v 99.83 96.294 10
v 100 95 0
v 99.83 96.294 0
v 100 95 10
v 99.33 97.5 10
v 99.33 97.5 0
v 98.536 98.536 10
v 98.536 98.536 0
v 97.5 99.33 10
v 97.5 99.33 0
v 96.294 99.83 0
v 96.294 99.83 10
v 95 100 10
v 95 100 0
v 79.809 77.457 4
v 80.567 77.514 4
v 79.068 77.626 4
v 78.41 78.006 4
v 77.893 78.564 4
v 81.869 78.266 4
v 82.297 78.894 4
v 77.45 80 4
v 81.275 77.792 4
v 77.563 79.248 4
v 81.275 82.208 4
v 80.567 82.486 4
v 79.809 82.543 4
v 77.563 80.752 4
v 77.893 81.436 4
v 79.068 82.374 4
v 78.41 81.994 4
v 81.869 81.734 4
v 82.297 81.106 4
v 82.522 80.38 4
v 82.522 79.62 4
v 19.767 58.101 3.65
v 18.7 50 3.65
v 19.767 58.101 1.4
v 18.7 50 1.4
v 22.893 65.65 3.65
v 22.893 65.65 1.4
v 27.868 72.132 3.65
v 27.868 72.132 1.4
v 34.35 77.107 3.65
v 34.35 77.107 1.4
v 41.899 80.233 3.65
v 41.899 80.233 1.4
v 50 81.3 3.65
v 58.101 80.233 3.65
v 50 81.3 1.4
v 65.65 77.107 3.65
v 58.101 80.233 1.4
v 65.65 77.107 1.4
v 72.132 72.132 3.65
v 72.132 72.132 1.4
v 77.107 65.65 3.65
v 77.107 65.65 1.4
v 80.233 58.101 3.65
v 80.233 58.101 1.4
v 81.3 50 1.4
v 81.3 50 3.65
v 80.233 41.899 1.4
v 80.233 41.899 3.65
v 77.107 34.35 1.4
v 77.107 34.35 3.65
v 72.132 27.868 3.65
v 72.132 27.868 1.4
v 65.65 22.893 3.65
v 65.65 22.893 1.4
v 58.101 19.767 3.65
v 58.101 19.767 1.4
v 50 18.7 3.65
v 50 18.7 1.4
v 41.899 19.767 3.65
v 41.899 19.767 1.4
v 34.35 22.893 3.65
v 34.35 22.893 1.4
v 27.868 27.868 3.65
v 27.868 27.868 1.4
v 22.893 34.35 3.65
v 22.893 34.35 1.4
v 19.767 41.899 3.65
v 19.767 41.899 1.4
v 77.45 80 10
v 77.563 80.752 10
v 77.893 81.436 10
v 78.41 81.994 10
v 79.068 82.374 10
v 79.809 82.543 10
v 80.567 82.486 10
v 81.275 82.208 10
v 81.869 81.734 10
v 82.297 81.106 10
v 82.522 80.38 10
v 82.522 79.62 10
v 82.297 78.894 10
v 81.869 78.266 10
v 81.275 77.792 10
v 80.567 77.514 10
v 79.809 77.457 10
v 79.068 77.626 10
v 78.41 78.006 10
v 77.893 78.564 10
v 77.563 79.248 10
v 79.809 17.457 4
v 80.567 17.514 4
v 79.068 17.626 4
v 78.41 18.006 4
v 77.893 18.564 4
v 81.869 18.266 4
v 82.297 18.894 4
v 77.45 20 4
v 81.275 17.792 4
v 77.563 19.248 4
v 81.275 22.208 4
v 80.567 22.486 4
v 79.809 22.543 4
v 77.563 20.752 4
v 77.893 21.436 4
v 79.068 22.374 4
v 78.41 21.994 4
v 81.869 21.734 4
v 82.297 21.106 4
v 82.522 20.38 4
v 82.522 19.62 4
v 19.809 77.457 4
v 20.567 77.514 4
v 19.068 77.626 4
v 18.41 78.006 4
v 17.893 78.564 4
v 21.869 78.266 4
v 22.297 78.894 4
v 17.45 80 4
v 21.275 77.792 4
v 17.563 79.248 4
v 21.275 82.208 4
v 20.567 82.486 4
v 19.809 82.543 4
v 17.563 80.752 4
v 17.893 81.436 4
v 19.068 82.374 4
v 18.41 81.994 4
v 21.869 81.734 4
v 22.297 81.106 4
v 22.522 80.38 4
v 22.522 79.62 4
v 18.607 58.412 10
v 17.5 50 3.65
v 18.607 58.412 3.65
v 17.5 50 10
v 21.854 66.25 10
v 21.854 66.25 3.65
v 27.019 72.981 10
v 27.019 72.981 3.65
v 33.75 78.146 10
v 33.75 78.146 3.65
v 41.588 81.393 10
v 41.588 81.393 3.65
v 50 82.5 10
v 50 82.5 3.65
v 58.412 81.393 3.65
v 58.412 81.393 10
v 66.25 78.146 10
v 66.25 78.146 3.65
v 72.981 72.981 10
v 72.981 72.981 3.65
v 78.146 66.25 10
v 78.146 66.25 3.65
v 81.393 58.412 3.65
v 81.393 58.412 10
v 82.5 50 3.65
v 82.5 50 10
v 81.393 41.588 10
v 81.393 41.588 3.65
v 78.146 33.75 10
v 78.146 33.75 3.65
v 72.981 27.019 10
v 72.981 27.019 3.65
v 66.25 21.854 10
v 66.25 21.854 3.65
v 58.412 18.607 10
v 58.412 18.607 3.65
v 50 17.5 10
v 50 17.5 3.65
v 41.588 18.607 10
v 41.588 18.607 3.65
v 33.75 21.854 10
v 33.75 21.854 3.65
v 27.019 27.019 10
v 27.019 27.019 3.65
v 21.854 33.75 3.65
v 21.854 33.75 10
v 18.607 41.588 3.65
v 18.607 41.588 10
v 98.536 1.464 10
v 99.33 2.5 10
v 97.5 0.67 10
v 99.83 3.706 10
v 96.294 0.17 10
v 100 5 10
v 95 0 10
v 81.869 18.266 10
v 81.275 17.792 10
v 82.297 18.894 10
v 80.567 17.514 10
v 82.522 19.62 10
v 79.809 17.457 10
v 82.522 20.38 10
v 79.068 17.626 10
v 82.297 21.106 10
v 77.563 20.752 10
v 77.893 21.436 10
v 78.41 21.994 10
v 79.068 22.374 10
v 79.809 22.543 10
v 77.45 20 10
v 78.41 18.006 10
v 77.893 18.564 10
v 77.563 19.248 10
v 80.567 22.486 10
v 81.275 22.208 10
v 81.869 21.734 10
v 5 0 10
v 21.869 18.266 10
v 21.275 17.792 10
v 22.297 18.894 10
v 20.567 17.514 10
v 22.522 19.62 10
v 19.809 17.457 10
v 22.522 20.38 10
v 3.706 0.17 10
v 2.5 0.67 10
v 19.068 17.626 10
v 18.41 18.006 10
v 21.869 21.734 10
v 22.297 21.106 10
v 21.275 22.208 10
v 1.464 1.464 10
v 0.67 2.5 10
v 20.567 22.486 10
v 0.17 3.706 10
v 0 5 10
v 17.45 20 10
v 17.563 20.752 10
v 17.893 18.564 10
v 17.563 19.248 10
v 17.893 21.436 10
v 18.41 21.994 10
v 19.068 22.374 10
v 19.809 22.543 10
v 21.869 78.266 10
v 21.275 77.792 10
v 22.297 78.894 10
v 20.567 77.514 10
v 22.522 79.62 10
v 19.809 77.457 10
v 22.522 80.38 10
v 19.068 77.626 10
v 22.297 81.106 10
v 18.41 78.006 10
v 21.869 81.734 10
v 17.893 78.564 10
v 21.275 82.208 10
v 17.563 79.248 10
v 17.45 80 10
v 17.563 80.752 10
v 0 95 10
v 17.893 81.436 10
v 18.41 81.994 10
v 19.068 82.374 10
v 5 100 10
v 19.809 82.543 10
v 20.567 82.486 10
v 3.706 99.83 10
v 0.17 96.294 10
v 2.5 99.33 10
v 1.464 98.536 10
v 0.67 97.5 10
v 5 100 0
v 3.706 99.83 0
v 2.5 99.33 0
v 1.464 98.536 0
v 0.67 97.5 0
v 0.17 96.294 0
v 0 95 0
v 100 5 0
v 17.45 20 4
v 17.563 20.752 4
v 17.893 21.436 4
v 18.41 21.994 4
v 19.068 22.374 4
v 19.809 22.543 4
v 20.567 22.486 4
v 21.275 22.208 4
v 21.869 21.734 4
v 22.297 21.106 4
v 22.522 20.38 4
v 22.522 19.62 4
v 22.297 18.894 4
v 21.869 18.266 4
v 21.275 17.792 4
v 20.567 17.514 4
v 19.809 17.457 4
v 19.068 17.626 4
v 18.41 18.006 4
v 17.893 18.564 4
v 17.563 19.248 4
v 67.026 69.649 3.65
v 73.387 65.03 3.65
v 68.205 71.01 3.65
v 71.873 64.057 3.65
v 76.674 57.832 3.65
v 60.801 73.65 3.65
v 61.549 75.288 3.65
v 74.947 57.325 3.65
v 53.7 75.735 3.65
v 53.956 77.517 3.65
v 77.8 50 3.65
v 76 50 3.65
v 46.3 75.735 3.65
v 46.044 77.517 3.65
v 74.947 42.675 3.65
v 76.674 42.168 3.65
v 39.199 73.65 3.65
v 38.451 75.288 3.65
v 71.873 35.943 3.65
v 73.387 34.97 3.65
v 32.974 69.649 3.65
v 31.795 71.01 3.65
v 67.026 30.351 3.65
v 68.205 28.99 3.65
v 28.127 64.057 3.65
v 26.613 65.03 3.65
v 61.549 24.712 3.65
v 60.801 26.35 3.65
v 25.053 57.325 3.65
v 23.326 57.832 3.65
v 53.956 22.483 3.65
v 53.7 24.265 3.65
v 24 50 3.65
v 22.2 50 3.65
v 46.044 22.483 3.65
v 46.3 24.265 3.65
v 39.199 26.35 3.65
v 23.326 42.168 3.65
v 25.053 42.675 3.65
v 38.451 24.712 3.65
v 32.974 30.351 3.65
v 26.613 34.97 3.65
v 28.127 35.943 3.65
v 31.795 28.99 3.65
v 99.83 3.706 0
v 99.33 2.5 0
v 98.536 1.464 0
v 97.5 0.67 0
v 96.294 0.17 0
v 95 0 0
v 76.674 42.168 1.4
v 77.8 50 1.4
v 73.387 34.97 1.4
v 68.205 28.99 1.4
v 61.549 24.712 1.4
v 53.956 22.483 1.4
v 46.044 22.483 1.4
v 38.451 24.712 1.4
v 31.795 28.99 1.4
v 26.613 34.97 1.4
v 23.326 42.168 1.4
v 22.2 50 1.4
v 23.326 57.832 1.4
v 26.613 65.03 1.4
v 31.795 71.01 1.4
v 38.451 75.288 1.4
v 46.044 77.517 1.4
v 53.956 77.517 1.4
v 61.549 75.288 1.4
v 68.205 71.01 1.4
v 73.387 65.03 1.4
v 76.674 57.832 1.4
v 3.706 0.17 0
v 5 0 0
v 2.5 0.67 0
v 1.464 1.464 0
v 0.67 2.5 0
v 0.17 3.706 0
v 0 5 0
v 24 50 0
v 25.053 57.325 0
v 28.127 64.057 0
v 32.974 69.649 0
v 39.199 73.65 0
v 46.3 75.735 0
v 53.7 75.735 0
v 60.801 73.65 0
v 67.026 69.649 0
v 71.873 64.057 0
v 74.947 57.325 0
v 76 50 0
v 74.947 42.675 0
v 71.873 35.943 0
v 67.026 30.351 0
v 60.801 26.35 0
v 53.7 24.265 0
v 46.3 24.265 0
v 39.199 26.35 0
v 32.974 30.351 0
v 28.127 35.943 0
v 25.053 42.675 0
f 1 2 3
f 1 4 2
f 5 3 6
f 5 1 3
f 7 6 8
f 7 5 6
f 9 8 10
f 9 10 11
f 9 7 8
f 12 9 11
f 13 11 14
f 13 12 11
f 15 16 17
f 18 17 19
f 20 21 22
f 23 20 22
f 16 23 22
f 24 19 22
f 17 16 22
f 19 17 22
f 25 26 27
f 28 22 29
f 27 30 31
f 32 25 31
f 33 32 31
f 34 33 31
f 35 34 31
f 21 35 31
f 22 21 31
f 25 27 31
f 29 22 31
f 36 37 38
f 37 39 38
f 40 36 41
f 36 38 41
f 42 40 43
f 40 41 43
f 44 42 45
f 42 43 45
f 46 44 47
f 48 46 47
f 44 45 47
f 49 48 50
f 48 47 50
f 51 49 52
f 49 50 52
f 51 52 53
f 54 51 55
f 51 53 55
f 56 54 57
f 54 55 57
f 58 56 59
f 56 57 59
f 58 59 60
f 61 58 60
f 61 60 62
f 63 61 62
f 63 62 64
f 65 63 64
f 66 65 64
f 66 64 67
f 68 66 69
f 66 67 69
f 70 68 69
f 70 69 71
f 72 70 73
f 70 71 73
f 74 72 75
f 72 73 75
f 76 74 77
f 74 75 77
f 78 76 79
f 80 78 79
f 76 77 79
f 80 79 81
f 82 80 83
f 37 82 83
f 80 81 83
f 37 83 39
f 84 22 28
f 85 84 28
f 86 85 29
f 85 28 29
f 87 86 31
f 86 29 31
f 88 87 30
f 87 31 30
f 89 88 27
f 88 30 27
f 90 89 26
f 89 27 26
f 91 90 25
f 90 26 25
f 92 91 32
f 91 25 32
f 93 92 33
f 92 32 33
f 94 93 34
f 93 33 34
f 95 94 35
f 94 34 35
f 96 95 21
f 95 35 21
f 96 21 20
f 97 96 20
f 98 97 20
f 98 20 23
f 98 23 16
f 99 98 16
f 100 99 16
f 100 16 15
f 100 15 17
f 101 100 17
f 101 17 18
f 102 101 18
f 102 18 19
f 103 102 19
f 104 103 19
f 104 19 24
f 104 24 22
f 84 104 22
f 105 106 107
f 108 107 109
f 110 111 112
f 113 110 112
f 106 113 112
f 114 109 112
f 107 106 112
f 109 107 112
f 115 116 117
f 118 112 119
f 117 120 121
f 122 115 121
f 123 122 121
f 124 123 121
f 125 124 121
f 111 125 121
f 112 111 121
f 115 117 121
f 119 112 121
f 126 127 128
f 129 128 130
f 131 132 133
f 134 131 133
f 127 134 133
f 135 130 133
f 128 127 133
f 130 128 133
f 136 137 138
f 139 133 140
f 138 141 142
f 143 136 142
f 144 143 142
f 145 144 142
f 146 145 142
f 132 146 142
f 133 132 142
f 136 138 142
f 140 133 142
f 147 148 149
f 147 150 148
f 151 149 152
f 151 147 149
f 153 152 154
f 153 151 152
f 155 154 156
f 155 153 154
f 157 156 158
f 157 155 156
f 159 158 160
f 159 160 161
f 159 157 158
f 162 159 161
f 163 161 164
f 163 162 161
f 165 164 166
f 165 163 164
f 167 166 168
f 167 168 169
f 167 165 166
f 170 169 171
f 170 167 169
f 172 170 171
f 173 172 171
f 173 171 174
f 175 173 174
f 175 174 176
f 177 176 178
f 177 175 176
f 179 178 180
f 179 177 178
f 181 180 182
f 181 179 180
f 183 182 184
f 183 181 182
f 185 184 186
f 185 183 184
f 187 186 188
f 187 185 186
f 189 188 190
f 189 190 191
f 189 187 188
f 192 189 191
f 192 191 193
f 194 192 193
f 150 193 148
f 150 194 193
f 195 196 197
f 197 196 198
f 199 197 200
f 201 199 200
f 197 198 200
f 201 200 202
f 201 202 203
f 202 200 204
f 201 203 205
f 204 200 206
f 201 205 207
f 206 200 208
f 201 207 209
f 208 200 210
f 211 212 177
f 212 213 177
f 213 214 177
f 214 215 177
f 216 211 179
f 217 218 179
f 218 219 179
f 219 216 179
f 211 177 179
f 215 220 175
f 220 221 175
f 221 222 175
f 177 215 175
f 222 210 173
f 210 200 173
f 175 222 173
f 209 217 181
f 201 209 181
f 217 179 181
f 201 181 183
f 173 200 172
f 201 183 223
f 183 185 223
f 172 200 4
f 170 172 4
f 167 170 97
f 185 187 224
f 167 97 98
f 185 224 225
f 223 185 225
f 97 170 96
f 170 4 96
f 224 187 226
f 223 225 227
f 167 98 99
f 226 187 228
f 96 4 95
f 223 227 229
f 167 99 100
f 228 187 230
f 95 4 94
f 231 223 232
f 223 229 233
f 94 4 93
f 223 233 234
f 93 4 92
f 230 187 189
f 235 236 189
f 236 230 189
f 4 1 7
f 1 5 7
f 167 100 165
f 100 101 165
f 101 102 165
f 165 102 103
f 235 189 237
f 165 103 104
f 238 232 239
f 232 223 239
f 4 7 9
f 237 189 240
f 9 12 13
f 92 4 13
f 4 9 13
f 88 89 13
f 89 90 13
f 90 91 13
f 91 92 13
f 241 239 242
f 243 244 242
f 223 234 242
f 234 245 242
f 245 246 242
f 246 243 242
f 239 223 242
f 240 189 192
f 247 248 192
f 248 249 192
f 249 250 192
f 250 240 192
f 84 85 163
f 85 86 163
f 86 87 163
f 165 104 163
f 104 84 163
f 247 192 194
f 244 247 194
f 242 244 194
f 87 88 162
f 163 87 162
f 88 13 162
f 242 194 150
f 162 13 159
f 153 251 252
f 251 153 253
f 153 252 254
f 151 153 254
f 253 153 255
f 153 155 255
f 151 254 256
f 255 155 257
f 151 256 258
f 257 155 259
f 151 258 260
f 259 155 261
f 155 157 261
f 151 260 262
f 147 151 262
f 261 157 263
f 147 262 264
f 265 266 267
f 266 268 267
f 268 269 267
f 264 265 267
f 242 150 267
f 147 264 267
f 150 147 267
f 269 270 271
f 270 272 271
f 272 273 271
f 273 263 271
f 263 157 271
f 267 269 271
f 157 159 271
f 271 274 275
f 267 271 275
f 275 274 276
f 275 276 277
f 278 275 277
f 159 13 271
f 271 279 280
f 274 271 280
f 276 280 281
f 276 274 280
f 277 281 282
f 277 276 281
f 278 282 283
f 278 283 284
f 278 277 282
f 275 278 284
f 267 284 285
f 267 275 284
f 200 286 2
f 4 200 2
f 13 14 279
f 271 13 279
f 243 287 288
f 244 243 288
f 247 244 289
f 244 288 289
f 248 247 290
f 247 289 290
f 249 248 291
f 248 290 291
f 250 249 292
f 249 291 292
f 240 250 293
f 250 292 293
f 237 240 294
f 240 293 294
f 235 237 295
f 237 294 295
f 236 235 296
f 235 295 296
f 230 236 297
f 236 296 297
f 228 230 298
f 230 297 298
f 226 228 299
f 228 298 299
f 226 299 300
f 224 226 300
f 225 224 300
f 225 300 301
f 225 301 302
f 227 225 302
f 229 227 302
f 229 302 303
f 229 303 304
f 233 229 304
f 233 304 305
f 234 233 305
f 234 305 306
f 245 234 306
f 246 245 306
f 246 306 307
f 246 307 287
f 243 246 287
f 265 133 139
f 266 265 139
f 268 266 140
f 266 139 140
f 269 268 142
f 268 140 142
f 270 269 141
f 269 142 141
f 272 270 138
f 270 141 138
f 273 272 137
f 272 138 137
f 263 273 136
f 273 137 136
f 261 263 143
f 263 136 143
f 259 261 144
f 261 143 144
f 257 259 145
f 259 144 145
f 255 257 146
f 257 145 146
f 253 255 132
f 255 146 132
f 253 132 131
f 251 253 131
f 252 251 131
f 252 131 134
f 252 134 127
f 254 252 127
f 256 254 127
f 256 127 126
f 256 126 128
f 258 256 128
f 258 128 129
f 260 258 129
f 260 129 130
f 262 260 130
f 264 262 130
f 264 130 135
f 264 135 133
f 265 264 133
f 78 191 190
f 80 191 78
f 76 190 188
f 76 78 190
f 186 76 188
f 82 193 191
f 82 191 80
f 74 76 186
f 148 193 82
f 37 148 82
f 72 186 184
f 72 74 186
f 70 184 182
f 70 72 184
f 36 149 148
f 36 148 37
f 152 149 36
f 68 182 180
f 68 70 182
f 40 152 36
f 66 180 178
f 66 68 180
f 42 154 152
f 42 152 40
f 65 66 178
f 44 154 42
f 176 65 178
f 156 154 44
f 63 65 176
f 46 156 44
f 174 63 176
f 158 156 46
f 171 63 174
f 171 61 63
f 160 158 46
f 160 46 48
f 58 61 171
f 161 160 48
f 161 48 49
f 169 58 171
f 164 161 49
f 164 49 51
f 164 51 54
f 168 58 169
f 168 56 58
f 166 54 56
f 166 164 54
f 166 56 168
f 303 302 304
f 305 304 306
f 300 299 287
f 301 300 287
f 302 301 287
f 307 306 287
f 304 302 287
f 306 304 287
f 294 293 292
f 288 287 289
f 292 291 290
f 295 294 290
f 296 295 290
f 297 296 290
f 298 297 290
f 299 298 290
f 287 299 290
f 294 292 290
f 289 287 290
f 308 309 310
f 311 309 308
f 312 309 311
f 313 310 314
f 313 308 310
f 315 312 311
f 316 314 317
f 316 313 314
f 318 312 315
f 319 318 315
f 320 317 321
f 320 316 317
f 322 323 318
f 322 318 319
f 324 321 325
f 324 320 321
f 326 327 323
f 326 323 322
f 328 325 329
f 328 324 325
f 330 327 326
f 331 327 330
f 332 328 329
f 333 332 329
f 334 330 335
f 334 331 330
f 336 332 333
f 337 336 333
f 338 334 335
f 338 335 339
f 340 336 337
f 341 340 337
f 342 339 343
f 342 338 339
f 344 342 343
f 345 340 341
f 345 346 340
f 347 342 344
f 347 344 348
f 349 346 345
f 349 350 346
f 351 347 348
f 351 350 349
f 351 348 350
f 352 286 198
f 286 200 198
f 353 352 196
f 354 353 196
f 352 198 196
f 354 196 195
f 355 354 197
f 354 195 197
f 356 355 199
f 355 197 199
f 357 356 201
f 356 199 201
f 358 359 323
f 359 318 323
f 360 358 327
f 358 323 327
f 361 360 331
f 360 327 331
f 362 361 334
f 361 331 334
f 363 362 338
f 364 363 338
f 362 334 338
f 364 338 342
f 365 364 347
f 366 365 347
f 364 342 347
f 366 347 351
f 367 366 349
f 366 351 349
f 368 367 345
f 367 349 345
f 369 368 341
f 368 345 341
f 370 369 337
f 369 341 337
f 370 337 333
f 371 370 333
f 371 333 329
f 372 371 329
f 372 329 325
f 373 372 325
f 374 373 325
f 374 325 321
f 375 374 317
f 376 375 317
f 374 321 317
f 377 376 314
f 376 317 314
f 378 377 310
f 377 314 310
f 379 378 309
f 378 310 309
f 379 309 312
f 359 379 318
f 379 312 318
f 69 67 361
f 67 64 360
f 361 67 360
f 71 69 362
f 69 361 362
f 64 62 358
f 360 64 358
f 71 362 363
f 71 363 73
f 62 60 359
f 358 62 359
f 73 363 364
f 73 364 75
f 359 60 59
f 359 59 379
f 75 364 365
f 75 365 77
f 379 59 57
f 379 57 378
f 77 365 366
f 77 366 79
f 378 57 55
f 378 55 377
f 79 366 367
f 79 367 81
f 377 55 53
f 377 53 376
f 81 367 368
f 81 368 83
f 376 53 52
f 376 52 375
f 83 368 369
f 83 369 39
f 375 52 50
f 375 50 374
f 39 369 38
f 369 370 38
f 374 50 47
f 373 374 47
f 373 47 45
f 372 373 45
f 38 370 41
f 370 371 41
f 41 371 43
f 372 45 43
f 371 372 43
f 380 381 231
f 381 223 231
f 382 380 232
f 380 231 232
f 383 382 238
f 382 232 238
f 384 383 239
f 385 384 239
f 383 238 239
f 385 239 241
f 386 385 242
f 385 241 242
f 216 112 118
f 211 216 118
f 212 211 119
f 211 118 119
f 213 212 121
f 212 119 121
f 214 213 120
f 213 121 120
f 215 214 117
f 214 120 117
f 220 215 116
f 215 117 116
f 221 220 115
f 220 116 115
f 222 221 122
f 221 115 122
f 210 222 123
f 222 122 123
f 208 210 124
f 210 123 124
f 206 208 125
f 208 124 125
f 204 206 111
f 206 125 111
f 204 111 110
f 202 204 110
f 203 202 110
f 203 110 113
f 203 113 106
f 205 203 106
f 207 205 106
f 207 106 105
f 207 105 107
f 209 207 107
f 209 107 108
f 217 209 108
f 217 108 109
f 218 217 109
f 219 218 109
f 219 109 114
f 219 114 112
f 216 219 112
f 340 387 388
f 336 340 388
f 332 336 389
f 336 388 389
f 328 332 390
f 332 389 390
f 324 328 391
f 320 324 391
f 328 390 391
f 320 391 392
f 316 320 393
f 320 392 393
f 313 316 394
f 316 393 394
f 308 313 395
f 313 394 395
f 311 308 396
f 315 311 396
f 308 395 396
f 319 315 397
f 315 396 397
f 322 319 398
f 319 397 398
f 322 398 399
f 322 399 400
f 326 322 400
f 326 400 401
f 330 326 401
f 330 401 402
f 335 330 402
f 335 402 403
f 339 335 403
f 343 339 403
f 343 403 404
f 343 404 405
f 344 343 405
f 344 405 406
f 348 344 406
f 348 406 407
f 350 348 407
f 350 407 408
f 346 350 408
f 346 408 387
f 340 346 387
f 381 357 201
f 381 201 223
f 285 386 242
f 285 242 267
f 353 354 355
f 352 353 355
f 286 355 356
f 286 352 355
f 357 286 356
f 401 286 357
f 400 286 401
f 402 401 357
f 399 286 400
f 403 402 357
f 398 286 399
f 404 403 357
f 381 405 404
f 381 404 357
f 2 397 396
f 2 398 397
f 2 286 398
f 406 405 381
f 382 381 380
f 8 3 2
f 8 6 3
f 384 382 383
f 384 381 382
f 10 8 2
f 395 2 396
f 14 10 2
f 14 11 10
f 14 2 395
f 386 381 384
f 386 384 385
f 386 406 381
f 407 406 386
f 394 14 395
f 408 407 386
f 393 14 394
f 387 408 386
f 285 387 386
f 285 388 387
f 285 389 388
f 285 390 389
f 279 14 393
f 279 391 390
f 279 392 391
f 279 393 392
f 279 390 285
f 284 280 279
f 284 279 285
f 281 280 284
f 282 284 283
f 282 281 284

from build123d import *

# Parameters (mm, degrees)
SKETCH1_W                  = 100
SKETCH1_H                  = 100
BOSS_EXTRUDE1_DEPTH        = 10
HOLE1_D                    = 62.6
HOLE1_DEPTH                = 8.6
SKETCH4_W                  = 27.8
SKETCH4_H                  = 2.25
SKETCH5_W                  = 1.2
SKETCH5_H                  = 6.35
F_10_CLEARANCE_HOLE1_D     = 5.1
F_10_CLEARANCE_HOLE1_DEPTH = 6
HOLE2_D                    = 52
FILLET1_R                  = 5


with BuildPart() as part:
    # Sketch1 → Boss-Extrude1 (new body)
    with BuildSketch(Plane(origin=(0, 0, 0), x_dir=(-1, 0, 0), z_dir=(0, 0, -1))):
        with Locations((-50, 50)):
            Rectangle(SKETCH1_W, SKETCH1_H)
    extrude(amount=-BOSS_EXTRUDE1_DEPTH)

    # Hole1
    with Locations(Plane.XY.offset(10)):
        with Locations((50, 50)):
            Hole(HOLE1_D / 2, depth=HOLE1_DEPTH)

    # Sketch4 → Revolve1 (revolve)
    with BuildSketch(Plane.XZ.offset(-50)):
        with Locations((63.9, 2.525)):
            Rectangle(SKETCH4_W, SKETCH4_H)
    revolve(axis=Axis((50, 50, 3.65), (0, 0, -1)))

    # Sketch5 → Cut-Revolve1 (revolve, cut)
    with BuildSketch(Plane.XZ.offset(-50), mode=Mode.PRIVATE) as cut_revolve1_sk:
        with Locations((81.9, 6.825)):
            Rectangle(SKETCH5_W, SKETCH5_H)
    revolve(cut_revolve1_sk.sketch.rotate(Axis((50, 50, 10), (0, 0, -1)), 180), axis=Axis((50, 50, 10), (0, 0, -1)), mode=Mode.SUBTRACT)

    # #10 Clearance Hole1
    with Locations(Plane.XY.offset(10)):
        with Locations((80, 80), (80, 20), (20, 20), (20, 80)):
            Hole(F_10_CLEARANCE_HOLE1_D / 2, depth=F_10_CLEARANCE_HOLE1_DEPTH)

    # Hole2 (through all)
    with Locations(Plane.XY.offset(3.65)):
        with Locations((50, 50)):
            Hole(HOLE2_D / 2)

    # Fillet1
    fillet1_edges = [part.edges().sort_by_distance(p)[0] for p in [
        (100, 100, 5),
        (0, 100, 5),
        (0, 0, 5),
        (100, 0, 5),
    ]]
    fillet(fillet1_edges, radius=FILLET1_R)


solid = part.part
